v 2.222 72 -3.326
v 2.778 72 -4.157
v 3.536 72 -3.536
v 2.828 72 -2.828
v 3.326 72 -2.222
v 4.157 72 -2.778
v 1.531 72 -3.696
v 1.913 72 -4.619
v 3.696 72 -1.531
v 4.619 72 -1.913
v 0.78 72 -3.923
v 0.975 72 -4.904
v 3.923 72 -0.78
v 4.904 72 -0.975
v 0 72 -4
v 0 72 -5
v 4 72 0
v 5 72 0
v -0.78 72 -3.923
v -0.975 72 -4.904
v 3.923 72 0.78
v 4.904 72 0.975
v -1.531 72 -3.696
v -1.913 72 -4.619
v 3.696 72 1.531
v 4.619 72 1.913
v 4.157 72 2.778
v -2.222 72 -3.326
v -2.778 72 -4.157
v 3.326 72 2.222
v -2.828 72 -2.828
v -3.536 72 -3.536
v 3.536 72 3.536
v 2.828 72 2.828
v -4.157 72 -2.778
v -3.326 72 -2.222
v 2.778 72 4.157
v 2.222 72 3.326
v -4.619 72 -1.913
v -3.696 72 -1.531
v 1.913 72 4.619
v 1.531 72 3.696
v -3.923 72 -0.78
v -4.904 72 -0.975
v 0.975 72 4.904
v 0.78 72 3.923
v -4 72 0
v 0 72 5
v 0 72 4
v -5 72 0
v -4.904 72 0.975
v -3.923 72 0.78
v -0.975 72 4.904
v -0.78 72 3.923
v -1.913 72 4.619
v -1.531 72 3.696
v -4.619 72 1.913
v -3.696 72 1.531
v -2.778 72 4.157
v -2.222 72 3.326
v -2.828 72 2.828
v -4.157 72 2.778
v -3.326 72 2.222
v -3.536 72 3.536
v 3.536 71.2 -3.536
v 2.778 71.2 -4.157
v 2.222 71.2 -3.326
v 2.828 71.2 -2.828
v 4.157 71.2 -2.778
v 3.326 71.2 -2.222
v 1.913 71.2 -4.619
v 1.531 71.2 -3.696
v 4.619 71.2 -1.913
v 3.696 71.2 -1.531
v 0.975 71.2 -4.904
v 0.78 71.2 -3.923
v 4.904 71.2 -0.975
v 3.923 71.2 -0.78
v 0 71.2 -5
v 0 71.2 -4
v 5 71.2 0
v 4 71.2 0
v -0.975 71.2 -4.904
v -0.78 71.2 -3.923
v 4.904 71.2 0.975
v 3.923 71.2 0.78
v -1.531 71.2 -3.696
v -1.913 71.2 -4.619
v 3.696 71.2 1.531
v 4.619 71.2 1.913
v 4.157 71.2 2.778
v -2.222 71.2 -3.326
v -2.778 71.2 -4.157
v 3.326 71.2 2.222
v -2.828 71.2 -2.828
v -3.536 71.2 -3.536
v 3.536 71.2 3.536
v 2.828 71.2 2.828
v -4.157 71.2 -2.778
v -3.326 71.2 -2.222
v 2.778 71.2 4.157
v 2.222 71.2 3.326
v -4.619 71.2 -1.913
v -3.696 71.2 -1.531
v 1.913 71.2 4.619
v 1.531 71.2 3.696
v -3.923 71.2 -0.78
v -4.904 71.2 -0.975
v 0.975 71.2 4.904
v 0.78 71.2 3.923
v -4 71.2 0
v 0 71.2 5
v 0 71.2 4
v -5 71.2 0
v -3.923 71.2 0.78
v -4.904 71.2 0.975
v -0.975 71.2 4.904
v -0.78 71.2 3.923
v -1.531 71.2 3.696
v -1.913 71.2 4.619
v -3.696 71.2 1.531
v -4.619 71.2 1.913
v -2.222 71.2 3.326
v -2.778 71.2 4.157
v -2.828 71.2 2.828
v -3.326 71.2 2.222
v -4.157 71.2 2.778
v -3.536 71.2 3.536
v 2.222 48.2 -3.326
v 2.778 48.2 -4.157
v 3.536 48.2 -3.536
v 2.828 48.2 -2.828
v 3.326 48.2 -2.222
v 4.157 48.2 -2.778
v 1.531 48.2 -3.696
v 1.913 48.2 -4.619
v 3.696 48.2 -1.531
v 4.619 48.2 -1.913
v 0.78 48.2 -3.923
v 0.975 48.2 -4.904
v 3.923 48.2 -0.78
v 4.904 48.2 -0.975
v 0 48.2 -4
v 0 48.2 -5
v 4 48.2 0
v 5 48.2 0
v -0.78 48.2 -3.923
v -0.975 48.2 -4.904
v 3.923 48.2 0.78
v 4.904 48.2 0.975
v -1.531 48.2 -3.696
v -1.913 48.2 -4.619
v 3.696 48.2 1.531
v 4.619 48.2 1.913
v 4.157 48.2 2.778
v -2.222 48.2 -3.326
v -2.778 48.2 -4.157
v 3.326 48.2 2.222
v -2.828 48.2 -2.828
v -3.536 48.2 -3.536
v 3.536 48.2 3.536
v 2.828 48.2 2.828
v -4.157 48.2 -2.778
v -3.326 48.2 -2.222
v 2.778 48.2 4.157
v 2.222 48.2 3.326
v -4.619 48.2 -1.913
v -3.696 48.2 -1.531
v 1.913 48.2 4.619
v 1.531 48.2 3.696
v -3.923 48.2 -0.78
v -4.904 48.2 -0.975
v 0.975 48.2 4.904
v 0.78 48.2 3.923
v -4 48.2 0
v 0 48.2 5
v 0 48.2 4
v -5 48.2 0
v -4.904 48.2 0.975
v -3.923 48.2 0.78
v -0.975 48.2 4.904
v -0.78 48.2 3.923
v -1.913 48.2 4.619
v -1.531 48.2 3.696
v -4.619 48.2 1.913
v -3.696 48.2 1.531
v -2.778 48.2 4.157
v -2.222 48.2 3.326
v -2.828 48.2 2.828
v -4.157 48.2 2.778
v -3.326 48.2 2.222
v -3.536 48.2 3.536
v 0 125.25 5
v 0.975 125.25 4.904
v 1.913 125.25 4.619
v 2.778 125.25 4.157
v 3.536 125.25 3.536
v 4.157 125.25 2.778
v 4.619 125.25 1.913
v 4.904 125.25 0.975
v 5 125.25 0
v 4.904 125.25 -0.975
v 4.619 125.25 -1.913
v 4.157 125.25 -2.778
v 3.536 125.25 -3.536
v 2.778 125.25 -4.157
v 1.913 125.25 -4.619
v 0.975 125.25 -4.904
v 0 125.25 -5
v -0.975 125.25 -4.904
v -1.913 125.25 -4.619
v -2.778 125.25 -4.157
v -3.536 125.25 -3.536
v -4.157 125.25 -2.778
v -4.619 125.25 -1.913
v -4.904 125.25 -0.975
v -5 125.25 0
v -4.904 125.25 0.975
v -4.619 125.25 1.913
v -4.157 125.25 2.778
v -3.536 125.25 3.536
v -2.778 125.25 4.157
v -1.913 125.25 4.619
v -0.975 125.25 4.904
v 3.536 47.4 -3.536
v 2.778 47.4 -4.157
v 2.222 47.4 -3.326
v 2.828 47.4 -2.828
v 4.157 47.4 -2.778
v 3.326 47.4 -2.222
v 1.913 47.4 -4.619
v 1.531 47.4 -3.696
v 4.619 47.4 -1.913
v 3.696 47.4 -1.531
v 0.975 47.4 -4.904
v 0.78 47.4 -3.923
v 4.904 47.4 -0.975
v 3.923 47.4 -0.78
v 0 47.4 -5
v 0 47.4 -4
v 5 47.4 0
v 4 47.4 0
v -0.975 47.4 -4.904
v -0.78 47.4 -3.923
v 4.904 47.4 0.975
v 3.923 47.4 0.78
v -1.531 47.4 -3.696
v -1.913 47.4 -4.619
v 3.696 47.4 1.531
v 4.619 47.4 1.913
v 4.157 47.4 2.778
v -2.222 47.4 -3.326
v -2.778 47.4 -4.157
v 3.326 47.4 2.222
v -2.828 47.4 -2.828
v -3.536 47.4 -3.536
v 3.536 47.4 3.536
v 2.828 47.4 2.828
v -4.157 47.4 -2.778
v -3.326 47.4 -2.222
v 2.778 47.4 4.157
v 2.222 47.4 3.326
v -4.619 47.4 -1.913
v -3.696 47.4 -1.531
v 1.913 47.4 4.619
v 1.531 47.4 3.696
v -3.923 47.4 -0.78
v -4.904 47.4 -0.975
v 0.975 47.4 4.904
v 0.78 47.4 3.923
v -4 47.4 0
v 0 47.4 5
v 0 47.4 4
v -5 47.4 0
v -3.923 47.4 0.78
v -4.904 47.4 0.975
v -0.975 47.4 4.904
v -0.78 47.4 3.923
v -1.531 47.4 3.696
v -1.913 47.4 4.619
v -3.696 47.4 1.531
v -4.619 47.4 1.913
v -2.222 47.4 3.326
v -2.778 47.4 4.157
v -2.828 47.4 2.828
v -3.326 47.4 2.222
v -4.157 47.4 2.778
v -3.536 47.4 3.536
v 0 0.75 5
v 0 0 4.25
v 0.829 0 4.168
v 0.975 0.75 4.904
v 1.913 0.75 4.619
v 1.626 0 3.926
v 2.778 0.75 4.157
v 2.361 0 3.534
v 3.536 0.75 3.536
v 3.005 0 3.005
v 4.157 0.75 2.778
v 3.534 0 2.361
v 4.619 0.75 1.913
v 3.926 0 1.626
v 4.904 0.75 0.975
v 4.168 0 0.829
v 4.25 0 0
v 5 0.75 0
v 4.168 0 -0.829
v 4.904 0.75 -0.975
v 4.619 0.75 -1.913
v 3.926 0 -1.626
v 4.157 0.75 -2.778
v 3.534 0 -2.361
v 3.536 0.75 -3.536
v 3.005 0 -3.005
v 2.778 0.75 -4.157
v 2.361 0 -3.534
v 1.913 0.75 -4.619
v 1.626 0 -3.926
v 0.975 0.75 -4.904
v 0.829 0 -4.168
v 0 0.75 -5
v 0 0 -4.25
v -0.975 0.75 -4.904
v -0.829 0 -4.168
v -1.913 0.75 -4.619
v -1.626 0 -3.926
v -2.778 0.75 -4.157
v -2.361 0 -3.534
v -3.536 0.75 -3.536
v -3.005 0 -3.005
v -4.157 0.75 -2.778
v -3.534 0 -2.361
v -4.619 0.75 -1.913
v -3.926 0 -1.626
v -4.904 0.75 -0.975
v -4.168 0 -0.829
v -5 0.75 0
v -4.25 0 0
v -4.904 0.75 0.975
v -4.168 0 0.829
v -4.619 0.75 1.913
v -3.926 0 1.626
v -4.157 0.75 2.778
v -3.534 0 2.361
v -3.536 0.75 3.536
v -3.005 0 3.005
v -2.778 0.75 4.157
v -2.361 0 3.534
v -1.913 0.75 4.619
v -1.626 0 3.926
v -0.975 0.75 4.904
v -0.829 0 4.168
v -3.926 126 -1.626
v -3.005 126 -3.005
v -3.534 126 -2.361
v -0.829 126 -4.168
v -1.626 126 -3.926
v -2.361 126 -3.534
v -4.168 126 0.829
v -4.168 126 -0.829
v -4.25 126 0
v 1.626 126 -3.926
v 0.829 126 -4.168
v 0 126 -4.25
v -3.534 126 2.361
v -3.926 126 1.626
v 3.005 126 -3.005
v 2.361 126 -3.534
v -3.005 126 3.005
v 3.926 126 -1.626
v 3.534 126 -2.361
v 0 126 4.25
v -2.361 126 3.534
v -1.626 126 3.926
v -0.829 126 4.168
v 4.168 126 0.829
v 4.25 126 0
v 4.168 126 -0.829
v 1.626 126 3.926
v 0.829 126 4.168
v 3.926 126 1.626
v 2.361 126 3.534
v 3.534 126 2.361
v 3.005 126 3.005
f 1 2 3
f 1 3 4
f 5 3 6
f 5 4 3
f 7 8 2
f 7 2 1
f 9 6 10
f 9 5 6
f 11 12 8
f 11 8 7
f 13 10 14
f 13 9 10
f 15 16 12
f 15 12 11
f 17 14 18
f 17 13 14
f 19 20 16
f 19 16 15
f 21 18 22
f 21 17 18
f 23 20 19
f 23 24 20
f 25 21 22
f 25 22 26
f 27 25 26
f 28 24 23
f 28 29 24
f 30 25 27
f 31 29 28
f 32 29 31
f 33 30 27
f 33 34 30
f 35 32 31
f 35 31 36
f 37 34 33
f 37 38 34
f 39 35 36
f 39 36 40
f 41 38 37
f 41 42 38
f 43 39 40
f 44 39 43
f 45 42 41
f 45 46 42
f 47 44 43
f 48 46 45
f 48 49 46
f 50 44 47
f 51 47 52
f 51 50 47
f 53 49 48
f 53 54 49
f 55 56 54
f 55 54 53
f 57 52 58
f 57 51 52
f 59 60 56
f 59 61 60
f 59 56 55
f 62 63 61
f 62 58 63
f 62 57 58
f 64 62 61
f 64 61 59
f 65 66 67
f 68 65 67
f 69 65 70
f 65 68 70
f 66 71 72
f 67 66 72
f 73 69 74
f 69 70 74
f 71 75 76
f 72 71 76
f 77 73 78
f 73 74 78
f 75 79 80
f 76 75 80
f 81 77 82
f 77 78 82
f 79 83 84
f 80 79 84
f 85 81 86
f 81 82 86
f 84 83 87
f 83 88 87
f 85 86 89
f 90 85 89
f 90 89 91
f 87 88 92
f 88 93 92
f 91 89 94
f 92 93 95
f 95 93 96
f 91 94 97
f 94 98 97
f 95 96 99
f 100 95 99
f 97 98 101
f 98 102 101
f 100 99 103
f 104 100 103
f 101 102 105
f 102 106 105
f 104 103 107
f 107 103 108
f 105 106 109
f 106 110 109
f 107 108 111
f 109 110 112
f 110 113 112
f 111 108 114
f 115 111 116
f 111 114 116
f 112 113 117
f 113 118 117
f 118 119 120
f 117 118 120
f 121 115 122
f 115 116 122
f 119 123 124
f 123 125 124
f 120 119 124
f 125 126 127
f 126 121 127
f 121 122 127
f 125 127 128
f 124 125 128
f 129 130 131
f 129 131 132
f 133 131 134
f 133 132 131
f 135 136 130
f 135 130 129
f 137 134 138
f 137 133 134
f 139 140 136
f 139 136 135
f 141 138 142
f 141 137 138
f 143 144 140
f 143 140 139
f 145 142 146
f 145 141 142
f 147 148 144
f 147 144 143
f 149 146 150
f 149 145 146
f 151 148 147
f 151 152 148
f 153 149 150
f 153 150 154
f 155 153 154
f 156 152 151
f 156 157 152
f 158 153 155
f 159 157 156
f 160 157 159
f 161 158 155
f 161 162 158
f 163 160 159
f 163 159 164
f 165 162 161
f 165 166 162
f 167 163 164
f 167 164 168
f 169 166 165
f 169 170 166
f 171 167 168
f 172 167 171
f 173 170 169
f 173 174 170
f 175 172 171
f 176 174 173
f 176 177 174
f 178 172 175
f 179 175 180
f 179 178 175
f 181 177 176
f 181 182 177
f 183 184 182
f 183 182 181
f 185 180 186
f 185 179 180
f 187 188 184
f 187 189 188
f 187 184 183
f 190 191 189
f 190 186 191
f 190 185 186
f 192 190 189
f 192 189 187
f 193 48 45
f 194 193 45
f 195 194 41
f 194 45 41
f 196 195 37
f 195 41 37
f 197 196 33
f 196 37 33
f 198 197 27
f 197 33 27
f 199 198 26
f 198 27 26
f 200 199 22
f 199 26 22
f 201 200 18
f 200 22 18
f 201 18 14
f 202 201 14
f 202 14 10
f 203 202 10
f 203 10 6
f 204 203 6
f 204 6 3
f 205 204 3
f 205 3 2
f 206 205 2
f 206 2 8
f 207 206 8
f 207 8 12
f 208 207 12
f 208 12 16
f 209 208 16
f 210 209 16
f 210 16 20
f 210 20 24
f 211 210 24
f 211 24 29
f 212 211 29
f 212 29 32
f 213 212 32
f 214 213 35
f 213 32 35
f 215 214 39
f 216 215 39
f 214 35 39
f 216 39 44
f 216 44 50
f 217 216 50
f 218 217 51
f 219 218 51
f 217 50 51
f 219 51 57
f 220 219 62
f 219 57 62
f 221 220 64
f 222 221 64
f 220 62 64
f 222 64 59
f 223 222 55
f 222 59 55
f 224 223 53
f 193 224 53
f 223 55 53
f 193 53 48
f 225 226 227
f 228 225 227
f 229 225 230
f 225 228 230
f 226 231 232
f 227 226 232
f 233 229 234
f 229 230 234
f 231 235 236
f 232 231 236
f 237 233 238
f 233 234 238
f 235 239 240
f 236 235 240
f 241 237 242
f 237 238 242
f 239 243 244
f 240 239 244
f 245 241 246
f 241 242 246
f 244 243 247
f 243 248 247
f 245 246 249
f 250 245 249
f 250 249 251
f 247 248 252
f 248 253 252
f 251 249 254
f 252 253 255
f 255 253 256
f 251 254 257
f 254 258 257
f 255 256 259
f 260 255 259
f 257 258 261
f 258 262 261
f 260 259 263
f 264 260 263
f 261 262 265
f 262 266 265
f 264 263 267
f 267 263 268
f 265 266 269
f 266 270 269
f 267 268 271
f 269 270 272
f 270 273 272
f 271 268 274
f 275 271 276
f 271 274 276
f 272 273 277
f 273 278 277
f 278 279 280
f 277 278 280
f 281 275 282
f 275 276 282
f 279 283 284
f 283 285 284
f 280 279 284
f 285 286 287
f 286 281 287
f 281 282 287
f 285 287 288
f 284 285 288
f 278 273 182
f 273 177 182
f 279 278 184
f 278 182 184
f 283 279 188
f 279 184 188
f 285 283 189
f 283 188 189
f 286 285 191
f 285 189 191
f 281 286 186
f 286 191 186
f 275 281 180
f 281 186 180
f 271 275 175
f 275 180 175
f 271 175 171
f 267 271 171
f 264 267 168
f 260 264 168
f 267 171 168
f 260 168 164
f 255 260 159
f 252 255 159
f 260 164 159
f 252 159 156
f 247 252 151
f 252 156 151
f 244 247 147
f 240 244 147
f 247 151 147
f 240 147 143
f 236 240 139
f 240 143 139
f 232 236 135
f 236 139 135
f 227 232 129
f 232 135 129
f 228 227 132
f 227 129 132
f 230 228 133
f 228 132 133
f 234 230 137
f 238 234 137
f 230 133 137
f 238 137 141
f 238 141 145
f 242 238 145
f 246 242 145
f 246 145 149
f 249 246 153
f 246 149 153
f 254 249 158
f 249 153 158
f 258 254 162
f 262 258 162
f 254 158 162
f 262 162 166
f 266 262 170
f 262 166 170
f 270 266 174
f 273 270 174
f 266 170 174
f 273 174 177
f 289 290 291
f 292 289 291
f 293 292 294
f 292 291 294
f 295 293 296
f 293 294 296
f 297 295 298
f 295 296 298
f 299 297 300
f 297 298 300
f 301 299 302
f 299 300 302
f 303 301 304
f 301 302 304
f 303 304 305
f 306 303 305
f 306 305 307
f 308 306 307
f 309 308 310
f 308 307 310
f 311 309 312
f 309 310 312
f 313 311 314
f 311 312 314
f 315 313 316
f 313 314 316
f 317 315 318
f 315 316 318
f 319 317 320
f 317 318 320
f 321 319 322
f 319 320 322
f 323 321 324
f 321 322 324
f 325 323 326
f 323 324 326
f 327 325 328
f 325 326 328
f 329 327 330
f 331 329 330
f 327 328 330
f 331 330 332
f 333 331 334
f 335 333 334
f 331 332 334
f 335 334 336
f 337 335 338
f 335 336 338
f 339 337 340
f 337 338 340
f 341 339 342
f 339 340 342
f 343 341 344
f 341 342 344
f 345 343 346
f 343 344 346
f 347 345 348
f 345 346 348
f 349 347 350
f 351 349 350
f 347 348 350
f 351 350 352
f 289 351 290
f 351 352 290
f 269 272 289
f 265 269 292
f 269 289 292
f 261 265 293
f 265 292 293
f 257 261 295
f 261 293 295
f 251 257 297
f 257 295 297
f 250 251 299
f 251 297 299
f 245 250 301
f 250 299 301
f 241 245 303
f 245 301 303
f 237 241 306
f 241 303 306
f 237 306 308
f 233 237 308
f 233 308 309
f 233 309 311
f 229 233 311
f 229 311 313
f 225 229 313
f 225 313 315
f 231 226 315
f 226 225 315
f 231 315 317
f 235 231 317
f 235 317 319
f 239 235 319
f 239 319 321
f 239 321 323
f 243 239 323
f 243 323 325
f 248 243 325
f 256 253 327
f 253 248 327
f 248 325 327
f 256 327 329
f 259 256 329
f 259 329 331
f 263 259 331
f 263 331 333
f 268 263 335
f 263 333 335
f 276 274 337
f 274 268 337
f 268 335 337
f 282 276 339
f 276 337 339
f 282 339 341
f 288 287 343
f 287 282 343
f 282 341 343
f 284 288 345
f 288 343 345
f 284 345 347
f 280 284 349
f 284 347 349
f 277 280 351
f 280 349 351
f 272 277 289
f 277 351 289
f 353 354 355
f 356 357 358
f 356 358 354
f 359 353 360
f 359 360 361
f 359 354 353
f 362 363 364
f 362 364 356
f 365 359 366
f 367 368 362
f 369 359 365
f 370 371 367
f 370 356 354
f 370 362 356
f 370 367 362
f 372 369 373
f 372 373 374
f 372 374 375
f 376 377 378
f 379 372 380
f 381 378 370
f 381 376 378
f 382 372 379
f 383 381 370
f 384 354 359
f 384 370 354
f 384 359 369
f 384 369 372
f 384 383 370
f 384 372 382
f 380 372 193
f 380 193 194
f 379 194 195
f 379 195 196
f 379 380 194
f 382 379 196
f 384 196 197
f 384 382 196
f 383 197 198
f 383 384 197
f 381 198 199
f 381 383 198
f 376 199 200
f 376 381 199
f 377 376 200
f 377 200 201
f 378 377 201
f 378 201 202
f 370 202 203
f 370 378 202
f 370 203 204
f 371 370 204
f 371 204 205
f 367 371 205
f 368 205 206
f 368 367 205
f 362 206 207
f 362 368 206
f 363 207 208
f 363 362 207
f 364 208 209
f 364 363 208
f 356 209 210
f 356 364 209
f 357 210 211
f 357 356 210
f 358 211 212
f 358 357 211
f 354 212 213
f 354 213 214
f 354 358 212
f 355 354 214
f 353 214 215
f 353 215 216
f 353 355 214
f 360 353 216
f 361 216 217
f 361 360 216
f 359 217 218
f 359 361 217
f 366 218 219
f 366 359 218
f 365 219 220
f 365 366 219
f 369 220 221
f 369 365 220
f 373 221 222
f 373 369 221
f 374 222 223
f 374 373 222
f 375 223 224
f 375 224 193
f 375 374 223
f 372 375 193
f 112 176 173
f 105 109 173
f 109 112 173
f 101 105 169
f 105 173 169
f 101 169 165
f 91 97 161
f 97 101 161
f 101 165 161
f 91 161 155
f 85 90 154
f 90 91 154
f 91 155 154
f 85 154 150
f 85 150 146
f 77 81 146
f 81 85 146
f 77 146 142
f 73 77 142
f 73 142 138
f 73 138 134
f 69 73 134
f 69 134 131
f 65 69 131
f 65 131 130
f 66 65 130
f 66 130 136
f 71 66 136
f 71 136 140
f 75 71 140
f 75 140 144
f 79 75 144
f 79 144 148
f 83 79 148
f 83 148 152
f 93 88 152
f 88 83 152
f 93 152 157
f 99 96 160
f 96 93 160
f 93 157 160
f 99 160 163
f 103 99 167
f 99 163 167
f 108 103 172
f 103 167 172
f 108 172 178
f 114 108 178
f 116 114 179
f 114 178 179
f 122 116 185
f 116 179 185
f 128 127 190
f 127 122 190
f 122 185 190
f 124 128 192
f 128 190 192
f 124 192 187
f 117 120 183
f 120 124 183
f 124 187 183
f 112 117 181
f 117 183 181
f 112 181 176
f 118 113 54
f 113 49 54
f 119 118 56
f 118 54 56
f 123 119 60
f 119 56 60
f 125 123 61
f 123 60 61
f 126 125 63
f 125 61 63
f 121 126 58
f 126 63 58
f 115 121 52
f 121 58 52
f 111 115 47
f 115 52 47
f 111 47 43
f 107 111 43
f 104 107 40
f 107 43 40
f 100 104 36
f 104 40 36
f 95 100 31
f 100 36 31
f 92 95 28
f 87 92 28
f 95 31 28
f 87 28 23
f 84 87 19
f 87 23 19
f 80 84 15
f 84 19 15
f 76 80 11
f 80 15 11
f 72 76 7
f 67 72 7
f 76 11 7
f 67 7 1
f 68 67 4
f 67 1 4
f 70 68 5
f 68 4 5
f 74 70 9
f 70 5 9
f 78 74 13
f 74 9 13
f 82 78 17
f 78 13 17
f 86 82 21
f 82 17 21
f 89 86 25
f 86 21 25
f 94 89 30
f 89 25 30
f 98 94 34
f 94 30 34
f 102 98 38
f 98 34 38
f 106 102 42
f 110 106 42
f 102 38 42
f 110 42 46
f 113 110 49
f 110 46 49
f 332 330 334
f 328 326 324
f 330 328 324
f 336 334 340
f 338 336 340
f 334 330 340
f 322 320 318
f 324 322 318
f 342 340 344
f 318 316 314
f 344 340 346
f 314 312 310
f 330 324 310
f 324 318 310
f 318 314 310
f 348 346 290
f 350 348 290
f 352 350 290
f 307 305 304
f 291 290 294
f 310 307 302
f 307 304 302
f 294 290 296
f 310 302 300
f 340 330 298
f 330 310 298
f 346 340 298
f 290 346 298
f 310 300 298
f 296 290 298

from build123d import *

# Parameters (mm, degrees)
SKETCH1_R           = 5
BOSS_EXTRUDE1_DEPTH = 126
CHAMFER1_SIZE       = 0.75
SKETCH2_W           = 1
SKETCH2_H           = 0.8


with BuildPart() as part:
    # Sketch1 → Boss-Extrude1 (new body)
    with BuildSketch(Plane(origin=(0, 0, 0), x_dir=(1, 0, 0), z_dir=(0, 1, 0))):
        with Locations(Location((0, 0, 0), (0, 0, 270))):
            Circle(SKETCH1_R)
    extrude(amount=BOSS_EXTRUDE1_DEPTH)

    # Chamfer1
    chamfer1_edges = [part.edges().sort_by_distance(p)[0] for p in [
        (0, 0, -5),
        (0, 126, -5),
    ]]
    chamfer(chamfer1_edges, length=CHAMFER1_SIZE)

    # Sketch2 → Cut-Revolve1 (revolve, cut)
    with BuildSketch(Plane.XY, mode=Mode.PRIVATE) as cut_revolve1_sk:
        with Locations((-4.5, 47.8)):
            Rectangle(SKETCH2_W, SKETCH2_H)
        with Locations((-4.5, 71.6)):
            Rectangle(SKETCH2_W, SKETCH2_H)
    revolve(cut_revolve1_sk.sketch.rotate(Axis((0, 111.50643277, 0), (0, -1, 0)), 270), axis=Axis((0, 111.50643277, 0), (0, -1, 0)), mode=Mode.SUBTRACT)


solid = part.part
